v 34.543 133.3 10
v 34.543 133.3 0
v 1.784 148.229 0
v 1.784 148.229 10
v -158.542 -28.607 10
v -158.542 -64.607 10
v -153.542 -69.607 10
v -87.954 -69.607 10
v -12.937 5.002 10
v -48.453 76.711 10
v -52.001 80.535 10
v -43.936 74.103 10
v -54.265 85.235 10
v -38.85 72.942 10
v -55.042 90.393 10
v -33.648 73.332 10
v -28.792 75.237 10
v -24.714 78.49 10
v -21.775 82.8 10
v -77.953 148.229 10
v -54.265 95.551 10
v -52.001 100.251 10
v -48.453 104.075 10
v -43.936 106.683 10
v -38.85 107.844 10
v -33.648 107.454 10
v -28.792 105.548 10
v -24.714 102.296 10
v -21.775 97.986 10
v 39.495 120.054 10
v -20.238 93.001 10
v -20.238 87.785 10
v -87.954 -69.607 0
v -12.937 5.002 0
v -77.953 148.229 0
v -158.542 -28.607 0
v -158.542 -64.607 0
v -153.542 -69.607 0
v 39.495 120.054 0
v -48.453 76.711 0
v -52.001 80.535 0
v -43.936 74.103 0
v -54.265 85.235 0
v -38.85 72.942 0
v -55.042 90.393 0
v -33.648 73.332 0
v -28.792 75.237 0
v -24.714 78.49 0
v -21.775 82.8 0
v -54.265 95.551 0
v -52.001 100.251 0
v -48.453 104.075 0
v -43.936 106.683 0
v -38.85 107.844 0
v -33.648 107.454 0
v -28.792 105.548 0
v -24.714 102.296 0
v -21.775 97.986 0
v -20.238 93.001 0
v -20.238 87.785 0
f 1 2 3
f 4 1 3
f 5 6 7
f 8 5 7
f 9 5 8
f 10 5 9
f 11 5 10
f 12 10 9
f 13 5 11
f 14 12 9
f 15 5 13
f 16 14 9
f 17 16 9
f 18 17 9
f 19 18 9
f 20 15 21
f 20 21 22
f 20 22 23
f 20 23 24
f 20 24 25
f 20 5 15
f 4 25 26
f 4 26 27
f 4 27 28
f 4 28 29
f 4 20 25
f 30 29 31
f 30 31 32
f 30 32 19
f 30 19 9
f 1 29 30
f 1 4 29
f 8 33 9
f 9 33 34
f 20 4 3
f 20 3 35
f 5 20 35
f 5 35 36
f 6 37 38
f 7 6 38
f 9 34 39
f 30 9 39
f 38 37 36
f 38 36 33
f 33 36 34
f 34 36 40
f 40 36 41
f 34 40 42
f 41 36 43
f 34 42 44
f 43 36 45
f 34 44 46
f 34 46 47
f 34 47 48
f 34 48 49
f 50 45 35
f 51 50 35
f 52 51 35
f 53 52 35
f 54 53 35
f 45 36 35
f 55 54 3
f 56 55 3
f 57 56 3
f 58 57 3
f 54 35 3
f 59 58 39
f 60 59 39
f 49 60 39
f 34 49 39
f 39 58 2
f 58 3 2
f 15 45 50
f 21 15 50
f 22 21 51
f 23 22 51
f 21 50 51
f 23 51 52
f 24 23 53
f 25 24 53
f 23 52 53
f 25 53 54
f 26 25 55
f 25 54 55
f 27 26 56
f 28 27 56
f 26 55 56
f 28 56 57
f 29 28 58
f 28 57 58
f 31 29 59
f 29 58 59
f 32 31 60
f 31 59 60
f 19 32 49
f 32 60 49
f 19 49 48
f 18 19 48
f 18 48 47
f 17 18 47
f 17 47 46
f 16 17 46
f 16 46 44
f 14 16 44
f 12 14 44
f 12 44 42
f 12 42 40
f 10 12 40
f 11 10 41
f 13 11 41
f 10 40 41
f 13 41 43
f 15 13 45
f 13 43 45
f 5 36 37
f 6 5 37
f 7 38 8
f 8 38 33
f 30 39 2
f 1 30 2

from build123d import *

# Parameters (mm, degrees)
BOSS_EXTRUDE1_DEPTH = 10
CUT_EXTRUDE1_DEPTH  = 10
SKETCH3_R           = 17.5
CUT_EXTRUDE2_DEPTH  = 10


with BuildPart() as part:
    # Sketch1 → Boss-Extrude1 (new body)
    with BuildSketch(Plane.XY):
        Polygon((-162.542296849, -28.60707156), (-158.542296849, -28.60707156), (-158.542296849, -64.60707156), (-153.542296849, -69.60707156), (-87.954361389, -69.60707156), (-12.936677956, 5.002214078), (39.495227245, 120.053529566), (34.542546963, 133.300074701), (1.783941212, 148.229031436), (3.442714182, 151.86887652), (-80.294668817, 151.86887652), align=None)
    extrude(amount=BOSS_EXTRUDE1_DEPTH)

    # Sketch2 → Cut-Extrude1 (cut)
    with BuildSketch(Plane.XY.offset(10)):
        Polygon((1.783941212, 148.229031436), (-77.953441788, 148.229031436), (-158.542296849, -28.60707156), (-177.628261738, -46.12321945), (-258.764859666, -56.78409298), (-118.247869319, 215.351823208), (19.357832203, 157.605676218), align=None)
    extrude(amount=-CUT_EXTRUDE1_DEPTH, mode=Mode.SUBTRACT)

    # Sketch3 → Cut-Extrude2 (cut)
    with BuildSketch(Plane(origin=(0, 0, 0), x_dir=(-1, 0, 0), z_dir=(0, 0, -1))):
        with Locations((37.542296849, 90.39292844)):
            Circle(SKETCH3_R)
    extrude(amount=-CUT_EXTRUDE2_DEPTH, mode=Mode.SUBTRACT)


solid = part.part
